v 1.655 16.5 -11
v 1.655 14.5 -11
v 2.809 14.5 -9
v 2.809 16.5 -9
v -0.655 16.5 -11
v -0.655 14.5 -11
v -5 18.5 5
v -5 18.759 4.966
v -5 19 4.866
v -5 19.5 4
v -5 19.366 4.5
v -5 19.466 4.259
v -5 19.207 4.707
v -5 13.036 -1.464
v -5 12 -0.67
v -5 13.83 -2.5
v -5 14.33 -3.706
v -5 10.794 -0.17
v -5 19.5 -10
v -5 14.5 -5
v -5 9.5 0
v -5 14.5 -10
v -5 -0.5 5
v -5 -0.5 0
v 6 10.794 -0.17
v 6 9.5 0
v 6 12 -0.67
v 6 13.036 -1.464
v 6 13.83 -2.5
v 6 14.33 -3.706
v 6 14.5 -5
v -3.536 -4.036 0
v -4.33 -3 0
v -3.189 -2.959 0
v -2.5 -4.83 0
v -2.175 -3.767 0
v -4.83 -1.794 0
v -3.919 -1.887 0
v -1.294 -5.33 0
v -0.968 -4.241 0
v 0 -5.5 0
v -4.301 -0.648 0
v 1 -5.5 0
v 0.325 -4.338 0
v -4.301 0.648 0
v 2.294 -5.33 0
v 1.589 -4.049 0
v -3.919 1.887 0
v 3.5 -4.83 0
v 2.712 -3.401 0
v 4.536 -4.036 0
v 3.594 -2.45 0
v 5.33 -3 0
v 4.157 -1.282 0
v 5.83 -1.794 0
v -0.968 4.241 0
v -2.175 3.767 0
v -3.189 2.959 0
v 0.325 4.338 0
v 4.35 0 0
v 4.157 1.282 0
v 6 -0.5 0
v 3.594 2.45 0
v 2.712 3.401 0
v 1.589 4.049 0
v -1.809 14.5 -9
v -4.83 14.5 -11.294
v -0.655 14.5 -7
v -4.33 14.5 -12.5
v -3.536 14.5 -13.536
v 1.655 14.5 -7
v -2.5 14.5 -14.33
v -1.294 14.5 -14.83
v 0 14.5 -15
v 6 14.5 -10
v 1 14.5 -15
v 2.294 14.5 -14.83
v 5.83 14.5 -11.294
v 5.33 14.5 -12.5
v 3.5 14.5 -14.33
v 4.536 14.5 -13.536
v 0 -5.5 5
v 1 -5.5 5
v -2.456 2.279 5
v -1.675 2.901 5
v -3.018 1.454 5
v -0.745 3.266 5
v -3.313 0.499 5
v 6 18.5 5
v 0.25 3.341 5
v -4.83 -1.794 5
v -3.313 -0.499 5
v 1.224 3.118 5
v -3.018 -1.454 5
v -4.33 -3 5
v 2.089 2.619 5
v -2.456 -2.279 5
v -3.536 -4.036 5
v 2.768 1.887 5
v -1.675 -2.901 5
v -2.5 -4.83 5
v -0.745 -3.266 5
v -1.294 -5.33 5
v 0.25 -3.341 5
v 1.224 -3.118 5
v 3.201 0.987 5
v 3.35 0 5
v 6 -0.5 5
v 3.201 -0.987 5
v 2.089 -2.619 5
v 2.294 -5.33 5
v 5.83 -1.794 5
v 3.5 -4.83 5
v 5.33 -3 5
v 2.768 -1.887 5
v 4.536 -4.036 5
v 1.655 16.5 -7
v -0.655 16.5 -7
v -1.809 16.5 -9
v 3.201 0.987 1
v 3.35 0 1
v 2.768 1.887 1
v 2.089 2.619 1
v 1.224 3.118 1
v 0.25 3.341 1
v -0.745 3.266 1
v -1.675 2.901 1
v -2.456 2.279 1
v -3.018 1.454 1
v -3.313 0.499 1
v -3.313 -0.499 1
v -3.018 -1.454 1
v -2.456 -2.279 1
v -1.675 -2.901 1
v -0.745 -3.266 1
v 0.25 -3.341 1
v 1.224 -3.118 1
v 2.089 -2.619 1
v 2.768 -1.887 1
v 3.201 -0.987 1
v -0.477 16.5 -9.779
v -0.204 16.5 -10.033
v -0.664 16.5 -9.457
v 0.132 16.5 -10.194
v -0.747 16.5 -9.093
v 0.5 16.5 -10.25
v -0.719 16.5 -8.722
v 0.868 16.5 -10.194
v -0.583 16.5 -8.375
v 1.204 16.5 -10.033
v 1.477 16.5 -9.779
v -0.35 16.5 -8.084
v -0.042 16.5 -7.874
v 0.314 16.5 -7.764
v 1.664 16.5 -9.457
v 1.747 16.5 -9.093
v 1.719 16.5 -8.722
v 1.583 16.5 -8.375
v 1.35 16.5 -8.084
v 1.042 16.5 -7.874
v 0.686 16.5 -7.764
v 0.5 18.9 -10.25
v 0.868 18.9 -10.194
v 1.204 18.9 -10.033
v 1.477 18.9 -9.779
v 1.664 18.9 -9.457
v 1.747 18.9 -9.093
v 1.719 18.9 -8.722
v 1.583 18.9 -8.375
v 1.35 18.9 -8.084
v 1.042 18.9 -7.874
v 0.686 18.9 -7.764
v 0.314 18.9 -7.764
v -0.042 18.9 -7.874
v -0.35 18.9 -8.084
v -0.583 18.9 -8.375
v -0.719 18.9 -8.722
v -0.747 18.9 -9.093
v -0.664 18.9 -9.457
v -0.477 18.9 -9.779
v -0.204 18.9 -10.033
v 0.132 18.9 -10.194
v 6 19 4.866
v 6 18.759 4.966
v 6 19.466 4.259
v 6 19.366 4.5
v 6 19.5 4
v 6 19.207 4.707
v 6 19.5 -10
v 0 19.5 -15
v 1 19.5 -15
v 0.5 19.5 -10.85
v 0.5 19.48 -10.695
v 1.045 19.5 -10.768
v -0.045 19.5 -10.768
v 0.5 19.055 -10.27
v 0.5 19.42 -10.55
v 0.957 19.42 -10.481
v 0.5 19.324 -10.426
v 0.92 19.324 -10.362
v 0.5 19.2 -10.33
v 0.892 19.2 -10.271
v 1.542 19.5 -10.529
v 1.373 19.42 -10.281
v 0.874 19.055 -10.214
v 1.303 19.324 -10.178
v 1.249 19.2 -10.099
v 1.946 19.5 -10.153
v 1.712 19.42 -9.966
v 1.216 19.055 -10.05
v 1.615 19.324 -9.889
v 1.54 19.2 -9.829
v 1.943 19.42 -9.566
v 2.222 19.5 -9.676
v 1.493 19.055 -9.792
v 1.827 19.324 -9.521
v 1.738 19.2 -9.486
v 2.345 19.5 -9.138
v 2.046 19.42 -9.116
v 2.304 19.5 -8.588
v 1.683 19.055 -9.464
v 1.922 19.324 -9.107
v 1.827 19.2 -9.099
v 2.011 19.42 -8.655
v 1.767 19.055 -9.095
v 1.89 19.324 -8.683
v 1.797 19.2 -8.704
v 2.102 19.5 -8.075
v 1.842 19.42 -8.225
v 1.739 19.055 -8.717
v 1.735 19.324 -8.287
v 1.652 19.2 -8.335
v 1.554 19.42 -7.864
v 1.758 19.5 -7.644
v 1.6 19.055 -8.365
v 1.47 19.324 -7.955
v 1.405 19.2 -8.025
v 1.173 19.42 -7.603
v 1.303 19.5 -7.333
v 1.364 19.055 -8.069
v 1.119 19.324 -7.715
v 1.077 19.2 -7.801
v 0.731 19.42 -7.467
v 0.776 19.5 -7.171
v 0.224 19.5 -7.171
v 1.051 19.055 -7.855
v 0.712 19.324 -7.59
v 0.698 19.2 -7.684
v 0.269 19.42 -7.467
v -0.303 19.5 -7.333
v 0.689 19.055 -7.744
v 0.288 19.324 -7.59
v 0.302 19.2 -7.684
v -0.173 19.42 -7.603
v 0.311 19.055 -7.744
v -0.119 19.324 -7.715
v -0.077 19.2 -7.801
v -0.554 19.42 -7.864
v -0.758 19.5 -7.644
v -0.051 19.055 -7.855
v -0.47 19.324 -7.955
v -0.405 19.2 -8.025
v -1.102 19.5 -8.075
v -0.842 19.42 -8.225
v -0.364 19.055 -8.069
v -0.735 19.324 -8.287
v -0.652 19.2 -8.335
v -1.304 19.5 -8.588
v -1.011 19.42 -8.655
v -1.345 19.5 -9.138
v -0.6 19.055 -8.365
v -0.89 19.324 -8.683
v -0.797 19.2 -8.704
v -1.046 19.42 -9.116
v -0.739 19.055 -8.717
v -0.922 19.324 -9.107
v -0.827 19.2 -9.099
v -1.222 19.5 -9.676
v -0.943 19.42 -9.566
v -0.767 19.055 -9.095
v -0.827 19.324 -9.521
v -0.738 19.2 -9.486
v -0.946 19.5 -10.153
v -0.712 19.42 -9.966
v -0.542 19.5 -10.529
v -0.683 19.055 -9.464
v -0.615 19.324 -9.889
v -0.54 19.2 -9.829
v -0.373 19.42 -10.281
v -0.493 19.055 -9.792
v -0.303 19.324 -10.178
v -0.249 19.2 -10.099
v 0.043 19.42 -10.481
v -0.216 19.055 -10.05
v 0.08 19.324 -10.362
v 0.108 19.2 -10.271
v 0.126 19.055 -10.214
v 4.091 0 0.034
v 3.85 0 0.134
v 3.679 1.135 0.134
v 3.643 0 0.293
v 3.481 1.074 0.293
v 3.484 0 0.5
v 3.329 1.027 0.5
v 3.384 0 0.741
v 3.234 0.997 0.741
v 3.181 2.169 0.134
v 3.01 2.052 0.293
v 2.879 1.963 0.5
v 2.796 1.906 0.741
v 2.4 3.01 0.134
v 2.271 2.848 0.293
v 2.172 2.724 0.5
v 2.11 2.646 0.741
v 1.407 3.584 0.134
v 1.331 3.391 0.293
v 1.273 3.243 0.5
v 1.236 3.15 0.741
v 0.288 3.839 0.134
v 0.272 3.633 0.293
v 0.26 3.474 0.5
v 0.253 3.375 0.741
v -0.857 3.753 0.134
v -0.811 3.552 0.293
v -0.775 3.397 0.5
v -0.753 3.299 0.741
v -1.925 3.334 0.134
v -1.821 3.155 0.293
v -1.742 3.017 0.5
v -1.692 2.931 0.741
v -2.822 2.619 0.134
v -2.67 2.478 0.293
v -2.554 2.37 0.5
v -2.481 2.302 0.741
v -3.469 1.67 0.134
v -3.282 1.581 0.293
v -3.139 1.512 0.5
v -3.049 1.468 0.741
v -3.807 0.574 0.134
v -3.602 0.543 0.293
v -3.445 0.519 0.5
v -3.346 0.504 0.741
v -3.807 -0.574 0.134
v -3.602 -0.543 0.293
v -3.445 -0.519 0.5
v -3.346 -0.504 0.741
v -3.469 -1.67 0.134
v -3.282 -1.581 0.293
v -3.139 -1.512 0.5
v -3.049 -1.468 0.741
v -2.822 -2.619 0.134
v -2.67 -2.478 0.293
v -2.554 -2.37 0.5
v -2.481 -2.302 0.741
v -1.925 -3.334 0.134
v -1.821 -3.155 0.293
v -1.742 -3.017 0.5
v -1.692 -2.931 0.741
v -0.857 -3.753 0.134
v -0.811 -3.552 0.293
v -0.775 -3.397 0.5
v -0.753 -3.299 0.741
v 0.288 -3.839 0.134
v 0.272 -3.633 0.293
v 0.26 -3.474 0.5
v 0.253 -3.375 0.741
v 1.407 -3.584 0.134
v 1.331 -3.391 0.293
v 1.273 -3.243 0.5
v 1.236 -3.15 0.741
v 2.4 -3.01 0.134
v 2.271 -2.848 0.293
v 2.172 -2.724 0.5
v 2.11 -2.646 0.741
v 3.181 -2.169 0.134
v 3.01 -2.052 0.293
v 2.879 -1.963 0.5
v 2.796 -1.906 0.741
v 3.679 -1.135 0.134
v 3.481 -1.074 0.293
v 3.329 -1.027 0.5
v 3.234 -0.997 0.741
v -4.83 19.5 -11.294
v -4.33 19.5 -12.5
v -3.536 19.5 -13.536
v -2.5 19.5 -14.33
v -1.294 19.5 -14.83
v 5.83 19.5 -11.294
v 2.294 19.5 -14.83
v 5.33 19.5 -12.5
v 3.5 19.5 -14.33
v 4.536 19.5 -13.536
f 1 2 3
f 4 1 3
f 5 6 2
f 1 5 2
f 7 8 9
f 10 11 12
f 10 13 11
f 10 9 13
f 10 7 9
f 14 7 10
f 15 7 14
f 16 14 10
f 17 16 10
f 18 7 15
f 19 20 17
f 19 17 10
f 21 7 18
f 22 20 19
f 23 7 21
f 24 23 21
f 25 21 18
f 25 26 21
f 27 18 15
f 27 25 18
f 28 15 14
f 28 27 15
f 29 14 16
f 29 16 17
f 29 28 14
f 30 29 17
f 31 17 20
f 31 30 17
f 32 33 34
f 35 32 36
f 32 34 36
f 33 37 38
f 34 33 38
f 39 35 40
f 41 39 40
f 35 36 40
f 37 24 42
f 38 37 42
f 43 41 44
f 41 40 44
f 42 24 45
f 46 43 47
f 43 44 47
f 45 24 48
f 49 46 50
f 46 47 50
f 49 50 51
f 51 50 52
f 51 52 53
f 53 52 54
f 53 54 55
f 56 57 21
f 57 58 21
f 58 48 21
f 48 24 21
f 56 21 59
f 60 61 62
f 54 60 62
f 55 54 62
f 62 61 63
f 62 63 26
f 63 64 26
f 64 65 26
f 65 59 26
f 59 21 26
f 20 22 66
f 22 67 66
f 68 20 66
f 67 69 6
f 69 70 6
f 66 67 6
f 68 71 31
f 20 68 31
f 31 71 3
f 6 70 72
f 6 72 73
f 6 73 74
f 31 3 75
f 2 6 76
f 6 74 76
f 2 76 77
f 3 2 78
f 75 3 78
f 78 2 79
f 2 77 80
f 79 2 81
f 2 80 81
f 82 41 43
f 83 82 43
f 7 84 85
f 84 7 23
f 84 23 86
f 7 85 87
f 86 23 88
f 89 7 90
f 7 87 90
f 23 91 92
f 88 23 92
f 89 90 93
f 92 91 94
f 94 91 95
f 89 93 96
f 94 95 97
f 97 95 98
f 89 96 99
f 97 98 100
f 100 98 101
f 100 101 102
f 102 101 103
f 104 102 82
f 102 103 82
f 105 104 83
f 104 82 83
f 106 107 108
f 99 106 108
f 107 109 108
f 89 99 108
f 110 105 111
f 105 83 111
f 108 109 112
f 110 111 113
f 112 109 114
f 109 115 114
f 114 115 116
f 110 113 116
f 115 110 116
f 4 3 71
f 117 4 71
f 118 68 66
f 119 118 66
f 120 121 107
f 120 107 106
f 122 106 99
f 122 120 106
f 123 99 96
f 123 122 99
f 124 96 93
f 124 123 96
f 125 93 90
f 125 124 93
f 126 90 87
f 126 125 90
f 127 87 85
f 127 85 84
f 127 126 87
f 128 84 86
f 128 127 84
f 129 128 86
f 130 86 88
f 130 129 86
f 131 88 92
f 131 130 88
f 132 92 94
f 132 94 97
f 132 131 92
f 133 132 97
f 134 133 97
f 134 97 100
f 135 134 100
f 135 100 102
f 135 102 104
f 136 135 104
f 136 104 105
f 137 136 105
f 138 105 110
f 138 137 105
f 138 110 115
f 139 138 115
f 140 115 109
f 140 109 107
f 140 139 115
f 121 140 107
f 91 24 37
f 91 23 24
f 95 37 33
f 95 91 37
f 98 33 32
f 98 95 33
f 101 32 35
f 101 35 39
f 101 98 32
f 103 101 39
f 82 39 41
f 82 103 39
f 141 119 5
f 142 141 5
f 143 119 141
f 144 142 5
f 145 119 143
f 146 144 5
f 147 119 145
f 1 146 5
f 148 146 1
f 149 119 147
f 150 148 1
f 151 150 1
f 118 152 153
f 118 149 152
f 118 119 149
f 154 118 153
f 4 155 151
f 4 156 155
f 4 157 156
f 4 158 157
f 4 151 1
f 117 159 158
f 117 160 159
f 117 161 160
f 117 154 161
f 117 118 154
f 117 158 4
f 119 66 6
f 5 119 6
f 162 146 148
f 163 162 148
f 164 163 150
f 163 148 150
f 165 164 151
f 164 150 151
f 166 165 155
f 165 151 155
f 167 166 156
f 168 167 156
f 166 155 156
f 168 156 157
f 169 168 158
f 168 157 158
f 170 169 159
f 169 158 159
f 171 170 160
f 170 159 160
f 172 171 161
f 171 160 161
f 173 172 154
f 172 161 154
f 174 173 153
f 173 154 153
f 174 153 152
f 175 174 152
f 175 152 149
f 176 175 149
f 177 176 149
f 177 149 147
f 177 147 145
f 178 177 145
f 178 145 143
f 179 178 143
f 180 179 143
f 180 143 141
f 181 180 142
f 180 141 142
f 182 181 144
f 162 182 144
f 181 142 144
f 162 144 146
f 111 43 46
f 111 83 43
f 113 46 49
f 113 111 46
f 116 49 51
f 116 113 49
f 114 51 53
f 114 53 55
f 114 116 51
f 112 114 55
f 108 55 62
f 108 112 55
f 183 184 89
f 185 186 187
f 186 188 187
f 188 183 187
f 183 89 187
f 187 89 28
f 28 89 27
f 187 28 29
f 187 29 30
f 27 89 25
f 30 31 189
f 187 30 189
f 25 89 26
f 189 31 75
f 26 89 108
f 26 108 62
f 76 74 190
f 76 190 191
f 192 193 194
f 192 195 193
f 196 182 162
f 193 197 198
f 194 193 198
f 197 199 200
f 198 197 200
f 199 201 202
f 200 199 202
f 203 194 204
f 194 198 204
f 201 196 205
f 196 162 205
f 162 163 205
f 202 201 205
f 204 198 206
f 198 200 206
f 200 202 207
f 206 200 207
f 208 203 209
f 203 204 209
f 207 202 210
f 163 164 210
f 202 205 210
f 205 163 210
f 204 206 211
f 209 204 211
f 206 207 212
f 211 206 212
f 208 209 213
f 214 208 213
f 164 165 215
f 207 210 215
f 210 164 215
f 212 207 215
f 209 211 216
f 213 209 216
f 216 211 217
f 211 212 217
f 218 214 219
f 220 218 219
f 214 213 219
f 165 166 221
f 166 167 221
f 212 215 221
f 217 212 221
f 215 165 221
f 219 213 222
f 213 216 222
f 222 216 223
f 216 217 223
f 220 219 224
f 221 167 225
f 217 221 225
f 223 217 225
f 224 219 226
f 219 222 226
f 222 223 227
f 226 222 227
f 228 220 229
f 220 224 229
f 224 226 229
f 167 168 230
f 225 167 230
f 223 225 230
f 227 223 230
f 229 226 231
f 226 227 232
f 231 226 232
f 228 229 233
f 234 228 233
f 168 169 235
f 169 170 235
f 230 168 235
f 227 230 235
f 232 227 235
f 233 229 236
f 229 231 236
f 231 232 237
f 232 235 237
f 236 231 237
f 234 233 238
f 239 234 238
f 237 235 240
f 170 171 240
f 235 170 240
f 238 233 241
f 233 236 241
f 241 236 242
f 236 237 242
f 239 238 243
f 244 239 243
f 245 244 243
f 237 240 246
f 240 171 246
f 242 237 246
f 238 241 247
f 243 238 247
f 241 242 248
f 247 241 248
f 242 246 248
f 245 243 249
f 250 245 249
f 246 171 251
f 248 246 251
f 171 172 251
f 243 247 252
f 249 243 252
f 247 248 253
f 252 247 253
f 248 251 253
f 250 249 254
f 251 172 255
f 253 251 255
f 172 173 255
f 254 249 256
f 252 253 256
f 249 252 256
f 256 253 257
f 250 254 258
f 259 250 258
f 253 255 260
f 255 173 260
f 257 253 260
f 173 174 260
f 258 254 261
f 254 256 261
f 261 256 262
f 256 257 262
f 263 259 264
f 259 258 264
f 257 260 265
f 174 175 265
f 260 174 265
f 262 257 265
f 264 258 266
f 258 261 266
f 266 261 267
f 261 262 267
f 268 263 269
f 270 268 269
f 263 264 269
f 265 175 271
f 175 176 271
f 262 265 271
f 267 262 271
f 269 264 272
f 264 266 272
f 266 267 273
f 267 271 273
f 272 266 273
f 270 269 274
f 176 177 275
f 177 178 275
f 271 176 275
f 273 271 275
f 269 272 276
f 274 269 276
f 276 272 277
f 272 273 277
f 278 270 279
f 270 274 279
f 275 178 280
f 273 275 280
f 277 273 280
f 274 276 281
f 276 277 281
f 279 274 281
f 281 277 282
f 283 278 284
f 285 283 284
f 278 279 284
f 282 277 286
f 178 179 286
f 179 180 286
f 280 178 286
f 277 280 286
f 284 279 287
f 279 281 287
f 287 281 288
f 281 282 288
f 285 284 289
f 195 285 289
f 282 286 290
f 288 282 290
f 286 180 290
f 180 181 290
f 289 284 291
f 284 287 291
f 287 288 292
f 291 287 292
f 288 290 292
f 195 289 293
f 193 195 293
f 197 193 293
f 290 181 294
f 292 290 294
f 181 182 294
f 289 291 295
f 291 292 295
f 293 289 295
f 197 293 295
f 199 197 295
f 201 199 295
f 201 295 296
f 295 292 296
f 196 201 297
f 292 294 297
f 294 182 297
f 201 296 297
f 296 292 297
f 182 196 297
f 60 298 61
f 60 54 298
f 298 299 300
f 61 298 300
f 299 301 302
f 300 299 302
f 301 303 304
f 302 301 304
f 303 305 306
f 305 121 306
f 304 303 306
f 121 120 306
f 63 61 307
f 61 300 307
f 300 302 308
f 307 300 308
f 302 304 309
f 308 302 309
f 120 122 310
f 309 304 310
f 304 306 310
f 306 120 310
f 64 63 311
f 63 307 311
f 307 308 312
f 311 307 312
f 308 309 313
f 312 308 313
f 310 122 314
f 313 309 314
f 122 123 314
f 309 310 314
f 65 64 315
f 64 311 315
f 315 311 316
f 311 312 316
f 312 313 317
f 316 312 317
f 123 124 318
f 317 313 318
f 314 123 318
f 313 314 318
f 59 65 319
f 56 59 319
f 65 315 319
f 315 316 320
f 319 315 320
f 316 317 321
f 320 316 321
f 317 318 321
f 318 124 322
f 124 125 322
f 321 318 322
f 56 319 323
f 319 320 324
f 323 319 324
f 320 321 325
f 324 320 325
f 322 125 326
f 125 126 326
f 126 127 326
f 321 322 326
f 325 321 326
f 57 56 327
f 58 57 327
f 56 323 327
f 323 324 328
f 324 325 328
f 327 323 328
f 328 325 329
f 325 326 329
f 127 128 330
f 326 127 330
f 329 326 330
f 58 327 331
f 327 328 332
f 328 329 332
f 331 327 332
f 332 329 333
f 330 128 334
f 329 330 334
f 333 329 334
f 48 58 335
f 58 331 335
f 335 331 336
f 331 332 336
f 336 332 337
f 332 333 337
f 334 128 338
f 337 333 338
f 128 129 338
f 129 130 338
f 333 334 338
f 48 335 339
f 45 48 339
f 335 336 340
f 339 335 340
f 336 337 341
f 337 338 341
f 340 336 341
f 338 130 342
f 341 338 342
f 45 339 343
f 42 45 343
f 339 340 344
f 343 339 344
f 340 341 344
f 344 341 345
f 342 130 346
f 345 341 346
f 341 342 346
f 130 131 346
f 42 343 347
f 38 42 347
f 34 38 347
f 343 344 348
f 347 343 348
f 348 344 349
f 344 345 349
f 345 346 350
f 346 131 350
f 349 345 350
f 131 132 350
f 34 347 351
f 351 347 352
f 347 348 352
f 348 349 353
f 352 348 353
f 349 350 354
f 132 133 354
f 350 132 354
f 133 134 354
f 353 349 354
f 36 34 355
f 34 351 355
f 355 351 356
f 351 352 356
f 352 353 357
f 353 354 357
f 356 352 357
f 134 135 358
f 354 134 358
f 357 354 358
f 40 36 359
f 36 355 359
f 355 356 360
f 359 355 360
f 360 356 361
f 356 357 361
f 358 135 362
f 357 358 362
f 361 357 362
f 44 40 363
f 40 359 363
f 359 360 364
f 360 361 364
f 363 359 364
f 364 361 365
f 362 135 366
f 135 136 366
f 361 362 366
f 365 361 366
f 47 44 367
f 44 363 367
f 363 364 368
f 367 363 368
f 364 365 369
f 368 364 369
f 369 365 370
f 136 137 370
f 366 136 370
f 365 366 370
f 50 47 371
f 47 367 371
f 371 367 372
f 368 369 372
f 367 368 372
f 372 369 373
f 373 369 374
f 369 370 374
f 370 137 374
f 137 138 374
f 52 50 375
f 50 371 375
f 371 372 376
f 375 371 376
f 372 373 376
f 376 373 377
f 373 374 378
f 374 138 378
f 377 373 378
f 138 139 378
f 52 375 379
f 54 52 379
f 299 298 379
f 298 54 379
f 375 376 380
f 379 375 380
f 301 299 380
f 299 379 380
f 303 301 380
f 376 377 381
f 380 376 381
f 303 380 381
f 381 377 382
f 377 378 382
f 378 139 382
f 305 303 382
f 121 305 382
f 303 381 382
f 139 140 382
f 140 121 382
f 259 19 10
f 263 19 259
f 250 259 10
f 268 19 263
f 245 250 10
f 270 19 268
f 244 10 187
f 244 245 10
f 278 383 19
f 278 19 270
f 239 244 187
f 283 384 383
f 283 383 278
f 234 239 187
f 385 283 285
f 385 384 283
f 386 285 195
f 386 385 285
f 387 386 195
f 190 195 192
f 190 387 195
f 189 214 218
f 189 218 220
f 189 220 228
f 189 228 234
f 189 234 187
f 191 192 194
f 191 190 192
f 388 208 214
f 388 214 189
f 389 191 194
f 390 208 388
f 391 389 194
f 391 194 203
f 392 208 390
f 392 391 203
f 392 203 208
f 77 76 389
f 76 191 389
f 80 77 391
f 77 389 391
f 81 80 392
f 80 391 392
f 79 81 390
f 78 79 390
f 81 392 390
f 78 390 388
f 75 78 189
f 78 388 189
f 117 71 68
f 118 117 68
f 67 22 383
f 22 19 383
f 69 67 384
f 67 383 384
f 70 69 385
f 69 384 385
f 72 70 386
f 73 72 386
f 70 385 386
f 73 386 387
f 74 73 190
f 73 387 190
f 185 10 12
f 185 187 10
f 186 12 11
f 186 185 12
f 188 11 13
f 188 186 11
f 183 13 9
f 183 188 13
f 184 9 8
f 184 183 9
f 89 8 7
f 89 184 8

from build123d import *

# Parameters (mm, degrees)
SKETCH_1_W          = 11
SKETCH_1_H          = 20
SKETCH_1_R          = 3.35
EXTRUDE_1_DEPTH     = 5
SKETCH_2_W          = 11
SKETCH_2_H          = 20
EXTRUDE_2_DEPTH     = 5
FILLET_1_R          = 5
FILLET_2_R          = 1
FILLET_4_R          = 1
FILLET_8_R          = 5
FILLET_9_R          = 5
CUT_EXTRUDE_3_DEPTH = 2
SKETCH_9_R          = 1.25
CUT_EXTRUDE_4_DEPTH = 3
FILLET_10_R         = 0.6


with BuildPart() as part:
    # Эскиз1 → Бобышка-Вытянуть1 (new body)
    with BuildSketch(Plane.XY):
        with Locations((0.5, 4.5)):
            Rectangle(SKETCH_1_W, SKETCH_1_H)
        Circle(SKETCH_1_R, mode=Mode.SUBTRACT)
    extrude(amount=EXTRUDE_1_DEPTH)

    # Эскиз2 → Бобышка-Вытянуть2 (add)
    with BuildSketch(Plane(origin=(0, 14.5, 0), x_dir=(1, 0, 0), z_dir=(0, 1, 0))):
        with Locations((0.5, 5)):
            Rectangle(SKETCH_2_W, SKETCH_2_H)
    extrude(amount=EXTRUDE_2_DEPTH)

    # Скругление1
    fillet_1_edges = [part.edges().sort_by_distance(p)[0] for p in [
        (0.5, 14.5, 0),
    ]]
    fillet(fillet_1_edges, radius=FILLET_1_R)

    # Скругление2
    fillet_2_edges = [part.edges().sort_by_distance(p)[0] for p in [
        (-3.35, 0, 0),
    ]]
    fillet(fillet_2_edges, radius=FILLET_2_R)

    # Скругление4
    fillet_4_edges = [part.edges().sort_by_distance(p)[0] for p in [
        (0.5, 19.5, 5),
    ]]
    fillet(fillet_4_edges, radius=FILLET_4_R)

    # Скругление8
    fillet_8_edges = [part.edges().sort_by_distance(p)[0] for p in [
        (6, -5.5, 2.5),
        (-5, -5.5, 2.5),
    ]]
    fillet(fillet_8_edges, radius=FILLET_8_R)

    # Скругление9
    fillet_9_edges = [part.edges().sort_by_distance(p)[0] for p in [
        (-5, 17, -15),
        (6, 17, -15),
    ]]
    fillet(fillet_9_edges, radius=FILLET_9_R)

    # Эскиз8 → Вырез-Вытянуть3 (cut)
    with BuildSketch(Plane.XZ.offset(-14.5)):
        Polygon((2.809401077, -9), (1.654700538, -7), (-0.654700538, -7), (-1.809401077, -9), (-0.654700538, -11), (1.654700538, -11), align=None)
    extrude(amount=-CUT_EXTRUDE_3_DEPTH, mode=Mode.SUBTRACT)

    # Эскиз9 → Вырез-Вытянуть4 (cut)
    with BuildSketch(Plane.XZ.offset(-16.5)):
        with Locations(Location((0.5, -9, 0), (0, 0, 270))):
            Circle(SKETCH_9_R)
    extrude(amount=-CUT_EXTRUDE_4_DEPTH, mode=Mode.SUBTRACT)

    # Скругление10
    fillet_10_edges = [part.edges().sort_by_distance(p)[0] for p in [
        (0.5, 19.5, -7.75),
    ]]
    fillet(fillet_10_edges, radius=FILLET_10_R)


solid = part.part
